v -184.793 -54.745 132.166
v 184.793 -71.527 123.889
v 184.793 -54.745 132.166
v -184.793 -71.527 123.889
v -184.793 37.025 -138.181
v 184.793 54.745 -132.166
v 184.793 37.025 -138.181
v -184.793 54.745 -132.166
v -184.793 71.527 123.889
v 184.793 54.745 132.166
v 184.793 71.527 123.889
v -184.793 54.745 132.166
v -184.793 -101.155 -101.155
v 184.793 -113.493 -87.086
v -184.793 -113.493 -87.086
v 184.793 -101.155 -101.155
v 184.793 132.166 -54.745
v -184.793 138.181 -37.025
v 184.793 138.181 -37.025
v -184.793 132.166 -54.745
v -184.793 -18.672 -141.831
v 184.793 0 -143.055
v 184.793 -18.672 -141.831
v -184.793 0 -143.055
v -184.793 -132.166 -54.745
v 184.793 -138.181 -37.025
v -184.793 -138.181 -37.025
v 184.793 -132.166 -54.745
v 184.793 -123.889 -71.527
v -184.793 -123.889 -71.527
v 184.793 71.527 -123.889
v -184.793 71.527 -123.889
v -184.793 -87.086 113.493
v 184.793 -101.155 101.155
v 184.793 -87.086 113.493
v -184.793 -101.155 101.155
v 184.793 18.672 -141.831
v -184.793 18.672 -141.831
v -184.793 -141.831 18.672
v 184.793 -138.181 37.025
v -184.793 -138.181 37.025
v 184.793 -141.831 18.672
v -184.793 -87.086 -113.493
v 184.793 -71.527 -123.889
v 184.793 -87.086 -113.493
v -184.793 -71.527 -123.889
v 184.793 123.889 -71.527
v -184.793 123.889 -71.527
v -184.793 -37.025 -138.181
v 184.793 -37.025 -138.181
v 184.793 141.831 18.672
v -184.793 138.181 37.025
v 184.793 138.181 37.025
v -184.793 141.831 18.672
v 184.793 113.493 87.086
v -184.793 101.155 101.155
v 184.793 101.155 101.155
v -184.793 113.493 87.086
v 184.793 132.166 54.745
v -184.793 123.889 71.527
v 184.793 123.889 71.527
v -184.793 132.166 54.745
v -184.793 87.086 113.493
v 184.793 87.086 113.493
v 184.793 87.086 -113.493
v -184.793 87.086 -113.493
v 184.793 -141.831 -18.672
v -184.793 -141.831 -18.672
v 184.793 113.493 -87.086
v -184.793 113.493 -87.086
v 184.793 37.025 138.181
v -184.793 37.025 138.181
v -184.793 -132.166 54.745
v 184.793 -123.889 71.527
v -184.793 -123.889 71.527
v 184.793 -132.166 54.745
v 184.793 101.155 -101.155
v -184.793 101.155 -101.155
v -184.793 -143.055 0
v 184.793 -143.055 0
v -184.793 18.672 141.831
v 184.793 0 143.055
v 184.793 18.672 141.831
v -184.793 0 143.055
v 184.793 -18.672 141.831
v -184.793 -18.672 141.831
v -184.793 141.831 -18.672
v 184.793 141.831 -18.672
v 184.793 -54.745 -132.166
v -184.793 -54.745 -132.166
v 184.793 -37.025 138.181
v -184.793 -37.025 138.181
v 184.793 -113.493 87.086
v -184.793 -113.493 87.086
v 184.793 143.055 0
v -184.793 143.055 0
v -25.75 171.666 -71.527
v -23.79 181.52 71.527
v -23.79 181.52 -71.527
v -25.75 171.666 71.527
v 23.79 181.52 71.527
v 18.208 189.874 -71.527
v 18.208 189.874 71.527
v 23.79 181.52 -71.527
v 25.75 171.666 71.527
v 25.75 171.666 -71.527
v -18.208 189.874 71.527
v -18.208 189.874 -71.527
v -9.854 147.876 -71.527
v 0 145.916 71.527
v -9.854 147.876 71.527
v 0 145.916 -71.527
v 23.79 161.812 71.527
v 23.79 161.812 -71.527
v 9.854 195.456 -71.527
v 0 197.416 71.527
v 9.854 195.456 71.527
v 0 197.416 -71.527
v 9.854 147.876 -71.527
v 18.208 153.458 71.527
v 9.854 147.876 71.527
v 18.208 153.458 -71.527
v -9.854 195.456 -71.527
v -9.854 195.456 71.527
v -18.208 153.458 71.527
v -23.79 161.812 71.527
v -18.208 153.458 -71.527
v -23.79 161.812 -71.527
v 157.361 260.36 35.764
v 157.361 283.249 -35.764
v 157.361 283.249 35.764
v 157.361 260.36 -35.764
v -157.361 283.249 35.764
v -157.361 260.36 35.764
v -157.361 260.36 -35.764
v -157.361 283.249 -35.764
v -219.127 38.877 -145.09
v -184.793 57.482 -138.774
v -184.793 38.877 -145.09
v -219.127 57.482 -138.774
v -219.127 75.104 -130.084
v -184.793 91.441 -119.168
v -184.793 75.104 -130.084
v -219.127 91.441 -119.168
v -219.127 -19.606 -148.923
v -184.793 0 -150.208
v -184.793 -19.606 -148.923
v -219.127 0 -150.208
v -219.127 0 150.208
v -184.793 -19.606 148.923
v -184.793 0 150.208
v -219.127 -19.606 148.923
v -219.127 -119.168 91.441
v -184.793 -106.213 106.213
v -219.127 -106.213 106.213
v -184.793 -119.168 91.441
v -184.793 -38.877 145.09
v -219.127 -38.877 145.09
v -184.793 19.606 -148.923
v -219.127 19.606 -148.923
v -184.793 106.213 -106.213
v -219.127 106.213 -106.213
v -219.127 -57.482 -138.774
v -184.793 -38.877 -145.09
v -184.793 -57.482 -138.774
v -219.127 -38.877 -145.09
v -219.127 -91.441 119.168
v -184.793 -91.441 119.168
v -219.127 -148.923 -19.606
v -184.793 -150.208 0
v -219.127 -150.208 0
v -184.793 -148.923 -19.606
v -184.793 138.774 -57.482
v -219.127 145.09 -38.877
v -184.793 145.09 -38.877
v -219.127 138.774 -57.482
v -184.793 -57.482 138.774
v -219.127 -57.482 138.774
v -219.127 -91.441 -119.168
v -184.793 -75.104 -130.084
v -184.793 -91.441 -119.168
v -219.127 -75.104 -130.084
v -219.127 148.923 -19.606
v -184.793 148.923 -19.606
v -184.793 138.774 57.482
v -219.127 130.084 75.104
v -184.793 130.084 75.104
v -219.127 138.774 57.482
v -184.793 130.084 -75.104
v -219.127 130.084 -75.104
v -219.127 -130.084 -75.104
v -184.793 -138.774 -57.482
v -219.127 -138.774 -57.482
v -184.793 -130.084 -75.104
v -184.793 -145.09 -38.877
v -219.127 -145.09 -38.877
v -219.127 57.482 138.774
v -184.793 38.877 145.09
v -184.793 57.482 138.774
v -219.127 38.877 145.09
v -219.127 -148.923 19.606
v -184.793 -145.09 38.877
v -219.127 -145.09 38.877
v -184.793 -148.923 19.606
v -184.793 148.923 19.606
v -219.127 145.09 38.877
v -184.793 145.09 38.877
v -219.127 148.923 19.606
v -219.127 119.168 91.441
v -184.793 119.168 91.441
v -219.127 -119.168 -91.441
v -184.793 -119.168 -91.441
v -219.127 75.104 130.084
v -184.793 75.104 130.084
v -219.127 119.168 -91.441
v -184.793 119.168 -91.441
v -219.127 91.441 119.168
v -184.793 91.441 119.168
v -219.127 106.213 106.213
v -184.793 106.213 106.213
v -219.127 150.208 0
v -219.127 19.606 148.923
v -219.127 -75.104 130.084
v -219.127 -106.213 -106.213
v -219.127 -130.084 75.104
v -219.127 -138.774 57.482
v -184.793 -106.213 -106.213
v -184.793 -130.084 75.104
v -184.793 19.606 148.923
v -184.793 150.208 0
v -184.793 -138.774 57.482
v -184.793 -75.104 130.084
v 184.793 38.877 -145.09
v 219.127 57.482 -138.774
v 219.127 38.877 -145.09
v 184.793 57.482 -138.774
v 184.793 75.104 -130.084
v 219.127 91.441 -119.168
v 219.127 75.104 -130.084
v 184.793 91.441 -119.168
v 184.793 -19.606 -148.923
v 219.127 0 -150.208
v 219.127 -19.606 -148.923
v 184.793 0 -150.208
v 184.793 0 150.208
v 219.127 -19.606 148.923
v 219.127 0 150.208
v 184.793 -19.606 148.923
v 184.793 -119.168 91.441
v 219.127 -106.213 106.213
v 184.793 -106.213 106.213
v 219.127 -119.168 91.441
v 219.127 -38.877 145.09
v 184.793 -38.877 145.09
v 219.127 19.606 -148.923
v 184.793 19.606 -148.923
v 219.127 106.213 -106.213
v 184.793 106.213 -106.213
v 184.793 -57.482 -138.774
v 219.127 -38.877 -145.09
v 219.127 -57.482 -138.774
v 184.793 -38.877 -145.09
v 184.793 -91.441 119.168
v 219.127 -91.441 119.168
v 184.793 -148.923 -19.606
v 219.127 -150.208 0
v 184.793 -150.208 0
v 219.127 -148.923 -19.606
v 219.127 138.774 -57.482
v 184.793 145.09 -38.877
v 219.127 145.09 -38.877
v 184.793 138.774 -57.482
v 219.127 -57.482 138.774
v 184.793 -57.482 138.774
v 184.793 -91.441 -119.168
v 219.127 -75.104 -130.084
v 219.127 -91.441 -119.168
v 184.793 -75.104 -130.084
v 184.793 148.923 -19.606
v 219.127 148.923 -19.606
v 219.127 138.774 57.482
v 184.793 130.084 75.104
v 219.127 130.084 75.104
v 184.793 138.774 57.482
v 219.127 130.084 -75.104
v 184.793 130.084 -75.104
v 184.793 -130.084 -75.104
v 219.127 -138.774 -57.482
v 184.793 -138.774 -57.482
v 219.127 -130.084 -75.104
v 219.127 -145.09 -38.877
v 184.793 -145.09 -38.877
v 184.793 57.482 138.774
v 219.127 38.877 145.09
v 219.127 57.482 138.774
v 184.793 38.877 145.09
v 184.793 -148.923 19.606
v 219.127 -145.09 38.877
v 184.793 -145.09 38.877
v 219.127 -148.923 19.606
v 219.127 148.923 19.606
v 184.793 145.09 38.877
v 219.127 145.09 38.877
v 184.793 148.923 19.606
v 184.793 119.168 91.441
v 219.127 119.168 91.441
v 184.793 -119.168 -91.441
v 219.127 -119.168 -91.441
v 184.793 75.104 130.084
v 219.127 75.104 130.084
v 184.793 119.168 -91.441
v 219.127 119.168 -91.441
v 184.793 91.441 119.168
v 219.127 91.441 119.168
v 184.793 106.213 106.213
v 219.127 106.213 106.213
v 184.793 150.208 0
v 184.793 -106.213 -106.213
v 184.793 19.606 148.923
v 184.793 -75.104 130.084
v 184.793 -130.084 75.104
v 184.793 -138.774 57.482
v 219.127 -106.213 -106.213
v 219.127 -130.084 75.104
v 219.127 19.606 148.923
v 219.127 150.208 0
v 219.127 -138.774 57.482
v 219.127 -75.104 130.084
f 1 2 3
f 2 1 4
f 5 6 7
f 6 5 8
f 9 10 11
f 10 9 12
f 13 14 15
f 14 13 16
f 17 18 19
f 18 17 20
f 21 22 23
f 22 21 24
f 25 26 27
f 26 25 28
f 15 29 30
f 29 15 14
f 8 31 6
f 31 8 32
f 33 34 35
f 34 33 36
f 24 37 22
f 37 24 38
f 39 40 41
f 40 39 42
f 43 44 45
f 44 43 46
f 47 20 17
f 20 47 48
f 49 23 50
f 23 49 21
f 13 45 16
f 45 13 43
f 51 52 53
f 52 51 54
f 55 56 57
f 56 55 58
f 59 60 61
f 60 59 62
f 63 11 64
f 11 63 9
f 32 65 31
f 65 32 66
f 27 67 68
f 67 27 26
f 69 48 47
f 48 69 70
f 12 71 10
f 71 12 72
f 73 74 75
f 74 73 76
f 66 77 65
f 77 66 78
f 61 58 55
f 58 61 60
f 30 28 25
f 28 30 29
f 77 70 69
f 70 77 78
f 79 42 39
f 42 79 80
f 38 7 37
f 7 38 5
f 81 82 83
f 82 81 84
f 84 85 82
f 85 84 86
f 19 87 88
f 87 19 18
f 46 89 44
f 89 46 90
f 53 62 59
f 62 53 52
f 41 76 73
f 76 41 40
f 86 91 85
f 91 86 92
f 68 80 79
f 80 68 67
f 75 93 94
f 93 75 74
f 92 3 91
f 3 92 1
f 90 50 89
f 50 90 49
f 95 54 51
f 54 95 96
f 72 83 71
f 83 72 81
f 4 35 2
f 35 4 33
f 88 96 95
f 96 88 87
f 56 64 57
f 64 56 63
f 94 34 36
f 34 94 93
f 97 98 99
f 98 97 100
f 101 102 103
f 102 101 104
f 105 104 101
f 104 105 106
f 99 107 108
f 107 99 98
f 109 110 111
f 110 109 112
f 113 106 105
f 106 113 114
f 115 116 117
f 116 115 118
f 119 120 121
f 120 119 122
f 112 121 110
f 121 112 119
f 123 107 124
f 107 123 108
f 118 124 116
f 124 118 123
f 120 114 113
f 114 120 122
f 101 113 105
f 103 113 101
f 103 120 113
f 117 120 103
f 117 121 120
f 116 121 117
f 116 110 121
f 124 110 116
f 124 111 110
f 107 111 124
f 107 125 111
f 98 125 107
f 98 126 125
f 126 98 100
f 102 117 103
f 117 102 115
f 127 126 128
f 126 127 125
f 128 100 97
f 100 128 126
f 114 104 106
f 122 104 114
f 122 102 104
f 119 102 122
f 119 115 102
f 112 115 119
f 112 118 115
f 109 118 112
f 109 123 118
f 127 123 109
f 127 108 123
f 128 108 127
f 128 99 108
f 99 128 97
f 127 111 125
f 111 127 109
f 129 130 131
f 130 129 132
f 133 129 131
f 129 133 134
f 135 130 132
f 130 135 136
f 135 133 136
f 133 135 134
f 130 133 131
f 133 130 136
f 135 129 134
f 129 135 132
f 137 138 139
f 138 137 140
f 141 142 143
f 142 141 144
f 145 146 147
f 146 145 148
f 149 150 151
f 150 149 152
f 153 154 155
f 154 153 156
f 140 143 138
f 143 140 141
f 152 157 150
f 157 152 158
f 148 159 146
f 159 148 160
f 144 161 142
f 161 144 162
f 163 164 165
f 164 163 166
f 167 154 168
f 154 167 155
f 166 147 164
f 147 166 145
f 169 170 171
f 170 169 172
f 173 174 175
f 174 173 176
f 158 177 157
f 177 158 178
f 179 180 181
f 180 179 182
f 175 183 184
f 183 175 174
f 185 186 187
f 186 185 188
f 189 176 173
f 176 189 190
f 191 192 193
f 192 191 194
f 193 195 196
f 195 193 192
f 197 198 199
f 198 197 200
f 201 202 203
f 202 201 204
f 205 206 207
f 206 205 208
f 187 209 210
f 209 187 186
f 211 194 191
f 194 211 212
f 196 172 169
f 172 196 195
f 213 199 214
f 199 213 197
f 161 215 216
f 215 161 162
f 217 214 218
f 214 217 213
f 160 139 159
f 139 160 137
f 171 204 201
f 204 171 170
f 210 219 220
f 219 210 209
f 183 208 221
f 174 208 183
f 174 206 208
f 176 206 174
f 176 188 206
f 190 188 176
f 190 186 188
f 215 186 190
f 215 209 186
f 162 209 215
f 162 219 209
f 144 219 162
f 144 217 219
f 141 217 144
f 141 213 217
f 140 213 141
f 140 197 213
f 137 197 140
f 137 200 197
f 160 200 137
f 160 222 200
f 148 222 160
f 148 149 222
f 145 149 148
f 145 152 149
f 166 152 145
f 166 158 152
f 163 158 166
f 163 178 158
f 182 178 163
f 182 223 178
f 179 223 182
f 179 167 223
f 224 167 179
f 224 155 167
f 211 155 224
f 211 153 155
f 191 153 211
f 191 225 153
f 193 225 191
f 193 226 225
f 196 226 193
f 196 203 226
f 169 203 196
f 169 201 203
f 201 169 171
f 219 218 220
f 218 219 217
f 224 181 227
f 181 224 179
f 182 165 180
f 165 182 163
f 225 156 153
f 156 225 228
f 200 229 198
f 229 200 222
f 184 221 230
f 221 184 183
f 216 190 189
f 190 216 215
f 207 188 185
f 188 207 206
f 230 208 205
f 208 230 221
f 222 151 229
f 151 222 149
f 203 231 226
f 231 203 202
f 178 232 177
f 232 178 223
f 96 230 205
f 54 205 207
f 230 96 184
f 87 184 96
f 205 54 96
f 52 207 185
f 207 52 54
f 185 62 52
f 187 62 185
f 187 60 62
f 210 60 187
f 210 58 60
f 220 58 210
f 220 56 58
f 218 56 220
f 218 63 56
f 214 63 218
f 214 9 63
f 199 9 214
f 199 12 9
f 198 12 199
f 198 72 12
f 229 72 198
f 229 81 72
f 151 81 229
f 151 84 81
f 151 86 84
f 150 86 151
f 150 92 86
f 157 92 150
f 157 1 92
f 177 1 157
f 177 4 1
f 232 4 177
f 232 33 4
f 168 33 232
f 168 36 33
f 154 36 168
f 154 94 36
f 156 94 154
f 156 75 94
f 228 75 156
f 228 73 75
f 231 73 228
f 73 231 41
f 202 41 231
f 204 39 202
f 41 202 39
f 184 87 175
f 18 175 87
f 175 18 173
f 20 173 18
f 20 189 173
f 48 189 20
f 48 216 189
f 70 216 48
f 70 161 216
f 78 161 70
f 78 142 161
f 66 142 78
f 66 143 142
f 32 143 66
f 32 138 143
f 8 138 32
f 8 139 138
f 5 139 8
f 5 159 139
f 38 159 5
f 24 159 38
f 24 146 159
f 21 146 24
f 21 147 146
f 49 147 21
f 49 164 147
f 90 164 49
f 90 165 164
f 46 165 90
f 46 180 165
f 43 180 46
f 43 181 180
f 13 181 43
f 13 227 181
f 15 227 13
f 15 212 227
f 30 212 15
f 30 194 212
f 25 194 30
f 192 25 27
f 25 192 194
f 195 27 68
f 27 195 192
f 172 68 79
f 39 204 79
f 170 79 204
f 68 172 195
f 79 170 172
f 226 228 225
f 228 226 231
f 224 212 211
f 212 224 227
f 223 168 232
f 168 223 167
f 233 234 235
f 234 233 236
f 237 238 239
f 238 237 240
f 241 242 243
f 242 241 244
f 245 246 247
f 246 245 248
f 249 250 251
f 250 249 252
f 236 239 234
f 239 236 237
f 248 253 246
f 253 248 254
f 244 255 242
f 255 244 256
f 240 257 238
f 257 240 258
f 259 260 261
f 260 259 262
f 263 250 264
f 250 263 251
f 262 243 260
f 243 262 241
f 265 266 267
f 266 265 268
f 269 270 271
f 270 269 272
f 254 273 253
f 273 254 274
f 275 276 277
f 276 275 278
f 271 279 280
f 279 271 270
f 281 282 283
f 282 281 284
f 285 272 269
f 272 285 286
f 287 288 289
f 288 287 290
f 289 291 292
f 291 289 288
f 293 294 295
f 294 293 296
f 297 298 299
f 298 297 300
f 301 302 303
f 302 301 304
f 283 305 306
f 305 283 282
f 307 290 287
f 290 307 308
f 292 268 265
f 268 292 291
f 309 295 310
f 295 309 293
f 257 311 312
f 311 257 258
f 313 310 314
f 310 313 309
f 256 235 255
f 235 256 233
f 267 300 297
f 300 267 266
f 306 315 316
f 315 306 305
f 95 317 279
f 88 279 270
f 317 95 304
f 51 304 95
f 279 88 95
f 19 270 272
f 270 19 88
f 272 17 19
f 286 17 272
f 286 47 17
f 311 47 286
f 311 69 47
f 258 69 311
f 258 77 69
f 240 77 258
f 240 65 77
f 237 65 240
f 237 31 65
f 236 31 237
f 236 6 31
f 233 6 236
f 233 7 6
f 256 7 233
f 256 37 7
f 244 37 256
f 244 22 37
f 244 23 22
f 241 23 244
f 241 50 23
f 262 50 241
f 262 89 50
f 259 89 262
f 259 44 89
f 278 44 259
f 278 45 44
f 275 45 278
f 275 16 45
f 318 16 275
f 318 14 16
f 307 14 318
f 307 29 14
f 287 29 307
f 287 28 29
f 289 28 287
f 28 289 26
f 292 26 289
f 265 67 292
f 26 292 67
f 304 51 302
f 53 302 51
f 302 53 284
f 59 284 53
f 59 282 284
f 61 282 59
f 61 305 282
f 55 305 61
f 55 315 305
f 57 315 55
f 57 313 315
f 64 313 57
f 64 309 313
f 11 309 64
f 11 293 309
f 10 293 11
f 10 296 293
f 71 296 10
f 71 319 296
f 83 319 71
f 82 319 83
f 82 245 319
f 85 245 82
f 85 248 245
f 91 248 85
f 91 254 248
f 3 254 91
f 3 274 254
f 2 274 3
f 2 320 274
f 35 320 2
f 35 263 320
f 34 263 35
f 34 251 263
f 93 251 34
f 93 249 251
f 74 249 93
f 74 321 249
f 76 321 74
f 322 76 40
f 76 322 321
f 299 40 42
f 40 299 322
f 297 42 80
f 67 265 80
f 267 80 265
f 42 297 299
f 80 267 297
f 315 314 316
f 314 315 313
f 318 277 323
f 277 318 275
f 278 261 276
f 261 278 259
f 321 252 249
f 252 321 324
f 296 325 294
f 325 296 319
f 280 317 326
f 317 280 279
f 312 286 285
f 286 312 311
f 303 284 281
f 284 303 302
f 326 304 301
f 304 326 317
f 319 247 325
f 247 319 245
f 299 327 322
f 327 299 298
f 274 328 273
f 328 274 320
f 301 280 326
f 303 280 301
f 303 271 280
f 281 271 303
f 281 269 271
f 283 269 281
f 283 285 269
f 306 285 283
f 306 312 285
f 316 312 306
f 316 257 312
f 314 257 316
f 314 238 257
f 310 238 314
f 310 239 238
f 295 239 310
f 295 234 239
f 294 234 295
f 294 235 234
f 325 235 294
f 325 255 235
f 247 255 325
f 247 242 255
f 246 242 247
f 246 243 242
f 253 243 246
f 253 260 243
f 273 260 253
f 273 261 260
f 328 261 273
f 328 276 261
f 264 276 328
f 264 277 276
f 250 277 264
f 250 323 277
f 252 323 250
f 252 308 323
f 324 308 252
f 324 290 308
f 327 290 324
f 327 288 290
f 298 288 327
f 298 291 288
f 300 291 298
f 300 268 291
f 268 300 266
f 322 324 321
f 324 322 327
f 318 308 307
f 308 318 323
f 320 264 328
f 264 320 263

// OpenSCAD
// Auto-generated by scripts/author_from_manifest.py (Phase D.3).
// Source: data/phase_d_manifest.json (sku_intent='viking-f1-dry-pipe-6in').
// Do not hand-edit — regenerate from the manifest.
//
// @part viking_f1_dry_pipe_6in
// @kind valve
// @category valve.dry.pipe
// @display-name "Viking Model F-1 Dry-Pipe Valve 6\""
// @mfg viking_group
// @mfg-pn F-1
// @listing UL FM
// @price-usd 1080.00
// @install-minutes 60
// @crew foreman
// @param size_in number default=6 label="Size" unit="in"
// @port inlet position=[-0.05,0,0] direction=[-1,0,0] style=grooved size_in=6 role=run_a
// @port outlet position=[0.05,0,0] direction=[1,0,0] style=grooved size_in=6 role=run_b

size_in = 6.0;

function od_mm(nps) =
    nps ==   1  ? 33.4 :
    nps == 1.25 ? 42.2 :
    nps == 1.5  ? 48.3 :
    nps ==   2  ? 60.3 :
    nps == 2.5  ? 73.0 :
    nps ==   3  ? 88.9 :
    nps ==   4  ? 114.3 :
    nps ==   6  ? 168.3 :
    nps ==   8  ? 219.1 : 73.0;

od = od_mm(size_in);
body_len = od * 2.4;
body_d   = od * 1.7;

union() {
    // Valve body
    rotate([0, 90, 0])
        cylinder(h = body_len, d = body_d, center = true, $fn = 48);
    // Stem / handle indicator
    translate([0, body_d * 0.6, 0])
        cylinder(h = body_d * 0.5, d = body_d * 0.18, center = true, $fn = 16);
    translate([0, body_d * 0.95, 0])
        cube([body_d * 1.1, body_d * 0.08, body_d * 0.25], center = true);
    // End flanges
    translate([-body_len/2, 0, 0])
        rotate([0, 90, 0])
        cylinder(h = body_d * 0.12, d = body_d * 1.05, center = true, $fn = 48);
    translate([ body_len/2, 0, 0])
        rotate([0, 90, 0])
        cylinder(h = body_d * 0.12, d = body_d * 1.05, center = true, $fn = 48);
}
